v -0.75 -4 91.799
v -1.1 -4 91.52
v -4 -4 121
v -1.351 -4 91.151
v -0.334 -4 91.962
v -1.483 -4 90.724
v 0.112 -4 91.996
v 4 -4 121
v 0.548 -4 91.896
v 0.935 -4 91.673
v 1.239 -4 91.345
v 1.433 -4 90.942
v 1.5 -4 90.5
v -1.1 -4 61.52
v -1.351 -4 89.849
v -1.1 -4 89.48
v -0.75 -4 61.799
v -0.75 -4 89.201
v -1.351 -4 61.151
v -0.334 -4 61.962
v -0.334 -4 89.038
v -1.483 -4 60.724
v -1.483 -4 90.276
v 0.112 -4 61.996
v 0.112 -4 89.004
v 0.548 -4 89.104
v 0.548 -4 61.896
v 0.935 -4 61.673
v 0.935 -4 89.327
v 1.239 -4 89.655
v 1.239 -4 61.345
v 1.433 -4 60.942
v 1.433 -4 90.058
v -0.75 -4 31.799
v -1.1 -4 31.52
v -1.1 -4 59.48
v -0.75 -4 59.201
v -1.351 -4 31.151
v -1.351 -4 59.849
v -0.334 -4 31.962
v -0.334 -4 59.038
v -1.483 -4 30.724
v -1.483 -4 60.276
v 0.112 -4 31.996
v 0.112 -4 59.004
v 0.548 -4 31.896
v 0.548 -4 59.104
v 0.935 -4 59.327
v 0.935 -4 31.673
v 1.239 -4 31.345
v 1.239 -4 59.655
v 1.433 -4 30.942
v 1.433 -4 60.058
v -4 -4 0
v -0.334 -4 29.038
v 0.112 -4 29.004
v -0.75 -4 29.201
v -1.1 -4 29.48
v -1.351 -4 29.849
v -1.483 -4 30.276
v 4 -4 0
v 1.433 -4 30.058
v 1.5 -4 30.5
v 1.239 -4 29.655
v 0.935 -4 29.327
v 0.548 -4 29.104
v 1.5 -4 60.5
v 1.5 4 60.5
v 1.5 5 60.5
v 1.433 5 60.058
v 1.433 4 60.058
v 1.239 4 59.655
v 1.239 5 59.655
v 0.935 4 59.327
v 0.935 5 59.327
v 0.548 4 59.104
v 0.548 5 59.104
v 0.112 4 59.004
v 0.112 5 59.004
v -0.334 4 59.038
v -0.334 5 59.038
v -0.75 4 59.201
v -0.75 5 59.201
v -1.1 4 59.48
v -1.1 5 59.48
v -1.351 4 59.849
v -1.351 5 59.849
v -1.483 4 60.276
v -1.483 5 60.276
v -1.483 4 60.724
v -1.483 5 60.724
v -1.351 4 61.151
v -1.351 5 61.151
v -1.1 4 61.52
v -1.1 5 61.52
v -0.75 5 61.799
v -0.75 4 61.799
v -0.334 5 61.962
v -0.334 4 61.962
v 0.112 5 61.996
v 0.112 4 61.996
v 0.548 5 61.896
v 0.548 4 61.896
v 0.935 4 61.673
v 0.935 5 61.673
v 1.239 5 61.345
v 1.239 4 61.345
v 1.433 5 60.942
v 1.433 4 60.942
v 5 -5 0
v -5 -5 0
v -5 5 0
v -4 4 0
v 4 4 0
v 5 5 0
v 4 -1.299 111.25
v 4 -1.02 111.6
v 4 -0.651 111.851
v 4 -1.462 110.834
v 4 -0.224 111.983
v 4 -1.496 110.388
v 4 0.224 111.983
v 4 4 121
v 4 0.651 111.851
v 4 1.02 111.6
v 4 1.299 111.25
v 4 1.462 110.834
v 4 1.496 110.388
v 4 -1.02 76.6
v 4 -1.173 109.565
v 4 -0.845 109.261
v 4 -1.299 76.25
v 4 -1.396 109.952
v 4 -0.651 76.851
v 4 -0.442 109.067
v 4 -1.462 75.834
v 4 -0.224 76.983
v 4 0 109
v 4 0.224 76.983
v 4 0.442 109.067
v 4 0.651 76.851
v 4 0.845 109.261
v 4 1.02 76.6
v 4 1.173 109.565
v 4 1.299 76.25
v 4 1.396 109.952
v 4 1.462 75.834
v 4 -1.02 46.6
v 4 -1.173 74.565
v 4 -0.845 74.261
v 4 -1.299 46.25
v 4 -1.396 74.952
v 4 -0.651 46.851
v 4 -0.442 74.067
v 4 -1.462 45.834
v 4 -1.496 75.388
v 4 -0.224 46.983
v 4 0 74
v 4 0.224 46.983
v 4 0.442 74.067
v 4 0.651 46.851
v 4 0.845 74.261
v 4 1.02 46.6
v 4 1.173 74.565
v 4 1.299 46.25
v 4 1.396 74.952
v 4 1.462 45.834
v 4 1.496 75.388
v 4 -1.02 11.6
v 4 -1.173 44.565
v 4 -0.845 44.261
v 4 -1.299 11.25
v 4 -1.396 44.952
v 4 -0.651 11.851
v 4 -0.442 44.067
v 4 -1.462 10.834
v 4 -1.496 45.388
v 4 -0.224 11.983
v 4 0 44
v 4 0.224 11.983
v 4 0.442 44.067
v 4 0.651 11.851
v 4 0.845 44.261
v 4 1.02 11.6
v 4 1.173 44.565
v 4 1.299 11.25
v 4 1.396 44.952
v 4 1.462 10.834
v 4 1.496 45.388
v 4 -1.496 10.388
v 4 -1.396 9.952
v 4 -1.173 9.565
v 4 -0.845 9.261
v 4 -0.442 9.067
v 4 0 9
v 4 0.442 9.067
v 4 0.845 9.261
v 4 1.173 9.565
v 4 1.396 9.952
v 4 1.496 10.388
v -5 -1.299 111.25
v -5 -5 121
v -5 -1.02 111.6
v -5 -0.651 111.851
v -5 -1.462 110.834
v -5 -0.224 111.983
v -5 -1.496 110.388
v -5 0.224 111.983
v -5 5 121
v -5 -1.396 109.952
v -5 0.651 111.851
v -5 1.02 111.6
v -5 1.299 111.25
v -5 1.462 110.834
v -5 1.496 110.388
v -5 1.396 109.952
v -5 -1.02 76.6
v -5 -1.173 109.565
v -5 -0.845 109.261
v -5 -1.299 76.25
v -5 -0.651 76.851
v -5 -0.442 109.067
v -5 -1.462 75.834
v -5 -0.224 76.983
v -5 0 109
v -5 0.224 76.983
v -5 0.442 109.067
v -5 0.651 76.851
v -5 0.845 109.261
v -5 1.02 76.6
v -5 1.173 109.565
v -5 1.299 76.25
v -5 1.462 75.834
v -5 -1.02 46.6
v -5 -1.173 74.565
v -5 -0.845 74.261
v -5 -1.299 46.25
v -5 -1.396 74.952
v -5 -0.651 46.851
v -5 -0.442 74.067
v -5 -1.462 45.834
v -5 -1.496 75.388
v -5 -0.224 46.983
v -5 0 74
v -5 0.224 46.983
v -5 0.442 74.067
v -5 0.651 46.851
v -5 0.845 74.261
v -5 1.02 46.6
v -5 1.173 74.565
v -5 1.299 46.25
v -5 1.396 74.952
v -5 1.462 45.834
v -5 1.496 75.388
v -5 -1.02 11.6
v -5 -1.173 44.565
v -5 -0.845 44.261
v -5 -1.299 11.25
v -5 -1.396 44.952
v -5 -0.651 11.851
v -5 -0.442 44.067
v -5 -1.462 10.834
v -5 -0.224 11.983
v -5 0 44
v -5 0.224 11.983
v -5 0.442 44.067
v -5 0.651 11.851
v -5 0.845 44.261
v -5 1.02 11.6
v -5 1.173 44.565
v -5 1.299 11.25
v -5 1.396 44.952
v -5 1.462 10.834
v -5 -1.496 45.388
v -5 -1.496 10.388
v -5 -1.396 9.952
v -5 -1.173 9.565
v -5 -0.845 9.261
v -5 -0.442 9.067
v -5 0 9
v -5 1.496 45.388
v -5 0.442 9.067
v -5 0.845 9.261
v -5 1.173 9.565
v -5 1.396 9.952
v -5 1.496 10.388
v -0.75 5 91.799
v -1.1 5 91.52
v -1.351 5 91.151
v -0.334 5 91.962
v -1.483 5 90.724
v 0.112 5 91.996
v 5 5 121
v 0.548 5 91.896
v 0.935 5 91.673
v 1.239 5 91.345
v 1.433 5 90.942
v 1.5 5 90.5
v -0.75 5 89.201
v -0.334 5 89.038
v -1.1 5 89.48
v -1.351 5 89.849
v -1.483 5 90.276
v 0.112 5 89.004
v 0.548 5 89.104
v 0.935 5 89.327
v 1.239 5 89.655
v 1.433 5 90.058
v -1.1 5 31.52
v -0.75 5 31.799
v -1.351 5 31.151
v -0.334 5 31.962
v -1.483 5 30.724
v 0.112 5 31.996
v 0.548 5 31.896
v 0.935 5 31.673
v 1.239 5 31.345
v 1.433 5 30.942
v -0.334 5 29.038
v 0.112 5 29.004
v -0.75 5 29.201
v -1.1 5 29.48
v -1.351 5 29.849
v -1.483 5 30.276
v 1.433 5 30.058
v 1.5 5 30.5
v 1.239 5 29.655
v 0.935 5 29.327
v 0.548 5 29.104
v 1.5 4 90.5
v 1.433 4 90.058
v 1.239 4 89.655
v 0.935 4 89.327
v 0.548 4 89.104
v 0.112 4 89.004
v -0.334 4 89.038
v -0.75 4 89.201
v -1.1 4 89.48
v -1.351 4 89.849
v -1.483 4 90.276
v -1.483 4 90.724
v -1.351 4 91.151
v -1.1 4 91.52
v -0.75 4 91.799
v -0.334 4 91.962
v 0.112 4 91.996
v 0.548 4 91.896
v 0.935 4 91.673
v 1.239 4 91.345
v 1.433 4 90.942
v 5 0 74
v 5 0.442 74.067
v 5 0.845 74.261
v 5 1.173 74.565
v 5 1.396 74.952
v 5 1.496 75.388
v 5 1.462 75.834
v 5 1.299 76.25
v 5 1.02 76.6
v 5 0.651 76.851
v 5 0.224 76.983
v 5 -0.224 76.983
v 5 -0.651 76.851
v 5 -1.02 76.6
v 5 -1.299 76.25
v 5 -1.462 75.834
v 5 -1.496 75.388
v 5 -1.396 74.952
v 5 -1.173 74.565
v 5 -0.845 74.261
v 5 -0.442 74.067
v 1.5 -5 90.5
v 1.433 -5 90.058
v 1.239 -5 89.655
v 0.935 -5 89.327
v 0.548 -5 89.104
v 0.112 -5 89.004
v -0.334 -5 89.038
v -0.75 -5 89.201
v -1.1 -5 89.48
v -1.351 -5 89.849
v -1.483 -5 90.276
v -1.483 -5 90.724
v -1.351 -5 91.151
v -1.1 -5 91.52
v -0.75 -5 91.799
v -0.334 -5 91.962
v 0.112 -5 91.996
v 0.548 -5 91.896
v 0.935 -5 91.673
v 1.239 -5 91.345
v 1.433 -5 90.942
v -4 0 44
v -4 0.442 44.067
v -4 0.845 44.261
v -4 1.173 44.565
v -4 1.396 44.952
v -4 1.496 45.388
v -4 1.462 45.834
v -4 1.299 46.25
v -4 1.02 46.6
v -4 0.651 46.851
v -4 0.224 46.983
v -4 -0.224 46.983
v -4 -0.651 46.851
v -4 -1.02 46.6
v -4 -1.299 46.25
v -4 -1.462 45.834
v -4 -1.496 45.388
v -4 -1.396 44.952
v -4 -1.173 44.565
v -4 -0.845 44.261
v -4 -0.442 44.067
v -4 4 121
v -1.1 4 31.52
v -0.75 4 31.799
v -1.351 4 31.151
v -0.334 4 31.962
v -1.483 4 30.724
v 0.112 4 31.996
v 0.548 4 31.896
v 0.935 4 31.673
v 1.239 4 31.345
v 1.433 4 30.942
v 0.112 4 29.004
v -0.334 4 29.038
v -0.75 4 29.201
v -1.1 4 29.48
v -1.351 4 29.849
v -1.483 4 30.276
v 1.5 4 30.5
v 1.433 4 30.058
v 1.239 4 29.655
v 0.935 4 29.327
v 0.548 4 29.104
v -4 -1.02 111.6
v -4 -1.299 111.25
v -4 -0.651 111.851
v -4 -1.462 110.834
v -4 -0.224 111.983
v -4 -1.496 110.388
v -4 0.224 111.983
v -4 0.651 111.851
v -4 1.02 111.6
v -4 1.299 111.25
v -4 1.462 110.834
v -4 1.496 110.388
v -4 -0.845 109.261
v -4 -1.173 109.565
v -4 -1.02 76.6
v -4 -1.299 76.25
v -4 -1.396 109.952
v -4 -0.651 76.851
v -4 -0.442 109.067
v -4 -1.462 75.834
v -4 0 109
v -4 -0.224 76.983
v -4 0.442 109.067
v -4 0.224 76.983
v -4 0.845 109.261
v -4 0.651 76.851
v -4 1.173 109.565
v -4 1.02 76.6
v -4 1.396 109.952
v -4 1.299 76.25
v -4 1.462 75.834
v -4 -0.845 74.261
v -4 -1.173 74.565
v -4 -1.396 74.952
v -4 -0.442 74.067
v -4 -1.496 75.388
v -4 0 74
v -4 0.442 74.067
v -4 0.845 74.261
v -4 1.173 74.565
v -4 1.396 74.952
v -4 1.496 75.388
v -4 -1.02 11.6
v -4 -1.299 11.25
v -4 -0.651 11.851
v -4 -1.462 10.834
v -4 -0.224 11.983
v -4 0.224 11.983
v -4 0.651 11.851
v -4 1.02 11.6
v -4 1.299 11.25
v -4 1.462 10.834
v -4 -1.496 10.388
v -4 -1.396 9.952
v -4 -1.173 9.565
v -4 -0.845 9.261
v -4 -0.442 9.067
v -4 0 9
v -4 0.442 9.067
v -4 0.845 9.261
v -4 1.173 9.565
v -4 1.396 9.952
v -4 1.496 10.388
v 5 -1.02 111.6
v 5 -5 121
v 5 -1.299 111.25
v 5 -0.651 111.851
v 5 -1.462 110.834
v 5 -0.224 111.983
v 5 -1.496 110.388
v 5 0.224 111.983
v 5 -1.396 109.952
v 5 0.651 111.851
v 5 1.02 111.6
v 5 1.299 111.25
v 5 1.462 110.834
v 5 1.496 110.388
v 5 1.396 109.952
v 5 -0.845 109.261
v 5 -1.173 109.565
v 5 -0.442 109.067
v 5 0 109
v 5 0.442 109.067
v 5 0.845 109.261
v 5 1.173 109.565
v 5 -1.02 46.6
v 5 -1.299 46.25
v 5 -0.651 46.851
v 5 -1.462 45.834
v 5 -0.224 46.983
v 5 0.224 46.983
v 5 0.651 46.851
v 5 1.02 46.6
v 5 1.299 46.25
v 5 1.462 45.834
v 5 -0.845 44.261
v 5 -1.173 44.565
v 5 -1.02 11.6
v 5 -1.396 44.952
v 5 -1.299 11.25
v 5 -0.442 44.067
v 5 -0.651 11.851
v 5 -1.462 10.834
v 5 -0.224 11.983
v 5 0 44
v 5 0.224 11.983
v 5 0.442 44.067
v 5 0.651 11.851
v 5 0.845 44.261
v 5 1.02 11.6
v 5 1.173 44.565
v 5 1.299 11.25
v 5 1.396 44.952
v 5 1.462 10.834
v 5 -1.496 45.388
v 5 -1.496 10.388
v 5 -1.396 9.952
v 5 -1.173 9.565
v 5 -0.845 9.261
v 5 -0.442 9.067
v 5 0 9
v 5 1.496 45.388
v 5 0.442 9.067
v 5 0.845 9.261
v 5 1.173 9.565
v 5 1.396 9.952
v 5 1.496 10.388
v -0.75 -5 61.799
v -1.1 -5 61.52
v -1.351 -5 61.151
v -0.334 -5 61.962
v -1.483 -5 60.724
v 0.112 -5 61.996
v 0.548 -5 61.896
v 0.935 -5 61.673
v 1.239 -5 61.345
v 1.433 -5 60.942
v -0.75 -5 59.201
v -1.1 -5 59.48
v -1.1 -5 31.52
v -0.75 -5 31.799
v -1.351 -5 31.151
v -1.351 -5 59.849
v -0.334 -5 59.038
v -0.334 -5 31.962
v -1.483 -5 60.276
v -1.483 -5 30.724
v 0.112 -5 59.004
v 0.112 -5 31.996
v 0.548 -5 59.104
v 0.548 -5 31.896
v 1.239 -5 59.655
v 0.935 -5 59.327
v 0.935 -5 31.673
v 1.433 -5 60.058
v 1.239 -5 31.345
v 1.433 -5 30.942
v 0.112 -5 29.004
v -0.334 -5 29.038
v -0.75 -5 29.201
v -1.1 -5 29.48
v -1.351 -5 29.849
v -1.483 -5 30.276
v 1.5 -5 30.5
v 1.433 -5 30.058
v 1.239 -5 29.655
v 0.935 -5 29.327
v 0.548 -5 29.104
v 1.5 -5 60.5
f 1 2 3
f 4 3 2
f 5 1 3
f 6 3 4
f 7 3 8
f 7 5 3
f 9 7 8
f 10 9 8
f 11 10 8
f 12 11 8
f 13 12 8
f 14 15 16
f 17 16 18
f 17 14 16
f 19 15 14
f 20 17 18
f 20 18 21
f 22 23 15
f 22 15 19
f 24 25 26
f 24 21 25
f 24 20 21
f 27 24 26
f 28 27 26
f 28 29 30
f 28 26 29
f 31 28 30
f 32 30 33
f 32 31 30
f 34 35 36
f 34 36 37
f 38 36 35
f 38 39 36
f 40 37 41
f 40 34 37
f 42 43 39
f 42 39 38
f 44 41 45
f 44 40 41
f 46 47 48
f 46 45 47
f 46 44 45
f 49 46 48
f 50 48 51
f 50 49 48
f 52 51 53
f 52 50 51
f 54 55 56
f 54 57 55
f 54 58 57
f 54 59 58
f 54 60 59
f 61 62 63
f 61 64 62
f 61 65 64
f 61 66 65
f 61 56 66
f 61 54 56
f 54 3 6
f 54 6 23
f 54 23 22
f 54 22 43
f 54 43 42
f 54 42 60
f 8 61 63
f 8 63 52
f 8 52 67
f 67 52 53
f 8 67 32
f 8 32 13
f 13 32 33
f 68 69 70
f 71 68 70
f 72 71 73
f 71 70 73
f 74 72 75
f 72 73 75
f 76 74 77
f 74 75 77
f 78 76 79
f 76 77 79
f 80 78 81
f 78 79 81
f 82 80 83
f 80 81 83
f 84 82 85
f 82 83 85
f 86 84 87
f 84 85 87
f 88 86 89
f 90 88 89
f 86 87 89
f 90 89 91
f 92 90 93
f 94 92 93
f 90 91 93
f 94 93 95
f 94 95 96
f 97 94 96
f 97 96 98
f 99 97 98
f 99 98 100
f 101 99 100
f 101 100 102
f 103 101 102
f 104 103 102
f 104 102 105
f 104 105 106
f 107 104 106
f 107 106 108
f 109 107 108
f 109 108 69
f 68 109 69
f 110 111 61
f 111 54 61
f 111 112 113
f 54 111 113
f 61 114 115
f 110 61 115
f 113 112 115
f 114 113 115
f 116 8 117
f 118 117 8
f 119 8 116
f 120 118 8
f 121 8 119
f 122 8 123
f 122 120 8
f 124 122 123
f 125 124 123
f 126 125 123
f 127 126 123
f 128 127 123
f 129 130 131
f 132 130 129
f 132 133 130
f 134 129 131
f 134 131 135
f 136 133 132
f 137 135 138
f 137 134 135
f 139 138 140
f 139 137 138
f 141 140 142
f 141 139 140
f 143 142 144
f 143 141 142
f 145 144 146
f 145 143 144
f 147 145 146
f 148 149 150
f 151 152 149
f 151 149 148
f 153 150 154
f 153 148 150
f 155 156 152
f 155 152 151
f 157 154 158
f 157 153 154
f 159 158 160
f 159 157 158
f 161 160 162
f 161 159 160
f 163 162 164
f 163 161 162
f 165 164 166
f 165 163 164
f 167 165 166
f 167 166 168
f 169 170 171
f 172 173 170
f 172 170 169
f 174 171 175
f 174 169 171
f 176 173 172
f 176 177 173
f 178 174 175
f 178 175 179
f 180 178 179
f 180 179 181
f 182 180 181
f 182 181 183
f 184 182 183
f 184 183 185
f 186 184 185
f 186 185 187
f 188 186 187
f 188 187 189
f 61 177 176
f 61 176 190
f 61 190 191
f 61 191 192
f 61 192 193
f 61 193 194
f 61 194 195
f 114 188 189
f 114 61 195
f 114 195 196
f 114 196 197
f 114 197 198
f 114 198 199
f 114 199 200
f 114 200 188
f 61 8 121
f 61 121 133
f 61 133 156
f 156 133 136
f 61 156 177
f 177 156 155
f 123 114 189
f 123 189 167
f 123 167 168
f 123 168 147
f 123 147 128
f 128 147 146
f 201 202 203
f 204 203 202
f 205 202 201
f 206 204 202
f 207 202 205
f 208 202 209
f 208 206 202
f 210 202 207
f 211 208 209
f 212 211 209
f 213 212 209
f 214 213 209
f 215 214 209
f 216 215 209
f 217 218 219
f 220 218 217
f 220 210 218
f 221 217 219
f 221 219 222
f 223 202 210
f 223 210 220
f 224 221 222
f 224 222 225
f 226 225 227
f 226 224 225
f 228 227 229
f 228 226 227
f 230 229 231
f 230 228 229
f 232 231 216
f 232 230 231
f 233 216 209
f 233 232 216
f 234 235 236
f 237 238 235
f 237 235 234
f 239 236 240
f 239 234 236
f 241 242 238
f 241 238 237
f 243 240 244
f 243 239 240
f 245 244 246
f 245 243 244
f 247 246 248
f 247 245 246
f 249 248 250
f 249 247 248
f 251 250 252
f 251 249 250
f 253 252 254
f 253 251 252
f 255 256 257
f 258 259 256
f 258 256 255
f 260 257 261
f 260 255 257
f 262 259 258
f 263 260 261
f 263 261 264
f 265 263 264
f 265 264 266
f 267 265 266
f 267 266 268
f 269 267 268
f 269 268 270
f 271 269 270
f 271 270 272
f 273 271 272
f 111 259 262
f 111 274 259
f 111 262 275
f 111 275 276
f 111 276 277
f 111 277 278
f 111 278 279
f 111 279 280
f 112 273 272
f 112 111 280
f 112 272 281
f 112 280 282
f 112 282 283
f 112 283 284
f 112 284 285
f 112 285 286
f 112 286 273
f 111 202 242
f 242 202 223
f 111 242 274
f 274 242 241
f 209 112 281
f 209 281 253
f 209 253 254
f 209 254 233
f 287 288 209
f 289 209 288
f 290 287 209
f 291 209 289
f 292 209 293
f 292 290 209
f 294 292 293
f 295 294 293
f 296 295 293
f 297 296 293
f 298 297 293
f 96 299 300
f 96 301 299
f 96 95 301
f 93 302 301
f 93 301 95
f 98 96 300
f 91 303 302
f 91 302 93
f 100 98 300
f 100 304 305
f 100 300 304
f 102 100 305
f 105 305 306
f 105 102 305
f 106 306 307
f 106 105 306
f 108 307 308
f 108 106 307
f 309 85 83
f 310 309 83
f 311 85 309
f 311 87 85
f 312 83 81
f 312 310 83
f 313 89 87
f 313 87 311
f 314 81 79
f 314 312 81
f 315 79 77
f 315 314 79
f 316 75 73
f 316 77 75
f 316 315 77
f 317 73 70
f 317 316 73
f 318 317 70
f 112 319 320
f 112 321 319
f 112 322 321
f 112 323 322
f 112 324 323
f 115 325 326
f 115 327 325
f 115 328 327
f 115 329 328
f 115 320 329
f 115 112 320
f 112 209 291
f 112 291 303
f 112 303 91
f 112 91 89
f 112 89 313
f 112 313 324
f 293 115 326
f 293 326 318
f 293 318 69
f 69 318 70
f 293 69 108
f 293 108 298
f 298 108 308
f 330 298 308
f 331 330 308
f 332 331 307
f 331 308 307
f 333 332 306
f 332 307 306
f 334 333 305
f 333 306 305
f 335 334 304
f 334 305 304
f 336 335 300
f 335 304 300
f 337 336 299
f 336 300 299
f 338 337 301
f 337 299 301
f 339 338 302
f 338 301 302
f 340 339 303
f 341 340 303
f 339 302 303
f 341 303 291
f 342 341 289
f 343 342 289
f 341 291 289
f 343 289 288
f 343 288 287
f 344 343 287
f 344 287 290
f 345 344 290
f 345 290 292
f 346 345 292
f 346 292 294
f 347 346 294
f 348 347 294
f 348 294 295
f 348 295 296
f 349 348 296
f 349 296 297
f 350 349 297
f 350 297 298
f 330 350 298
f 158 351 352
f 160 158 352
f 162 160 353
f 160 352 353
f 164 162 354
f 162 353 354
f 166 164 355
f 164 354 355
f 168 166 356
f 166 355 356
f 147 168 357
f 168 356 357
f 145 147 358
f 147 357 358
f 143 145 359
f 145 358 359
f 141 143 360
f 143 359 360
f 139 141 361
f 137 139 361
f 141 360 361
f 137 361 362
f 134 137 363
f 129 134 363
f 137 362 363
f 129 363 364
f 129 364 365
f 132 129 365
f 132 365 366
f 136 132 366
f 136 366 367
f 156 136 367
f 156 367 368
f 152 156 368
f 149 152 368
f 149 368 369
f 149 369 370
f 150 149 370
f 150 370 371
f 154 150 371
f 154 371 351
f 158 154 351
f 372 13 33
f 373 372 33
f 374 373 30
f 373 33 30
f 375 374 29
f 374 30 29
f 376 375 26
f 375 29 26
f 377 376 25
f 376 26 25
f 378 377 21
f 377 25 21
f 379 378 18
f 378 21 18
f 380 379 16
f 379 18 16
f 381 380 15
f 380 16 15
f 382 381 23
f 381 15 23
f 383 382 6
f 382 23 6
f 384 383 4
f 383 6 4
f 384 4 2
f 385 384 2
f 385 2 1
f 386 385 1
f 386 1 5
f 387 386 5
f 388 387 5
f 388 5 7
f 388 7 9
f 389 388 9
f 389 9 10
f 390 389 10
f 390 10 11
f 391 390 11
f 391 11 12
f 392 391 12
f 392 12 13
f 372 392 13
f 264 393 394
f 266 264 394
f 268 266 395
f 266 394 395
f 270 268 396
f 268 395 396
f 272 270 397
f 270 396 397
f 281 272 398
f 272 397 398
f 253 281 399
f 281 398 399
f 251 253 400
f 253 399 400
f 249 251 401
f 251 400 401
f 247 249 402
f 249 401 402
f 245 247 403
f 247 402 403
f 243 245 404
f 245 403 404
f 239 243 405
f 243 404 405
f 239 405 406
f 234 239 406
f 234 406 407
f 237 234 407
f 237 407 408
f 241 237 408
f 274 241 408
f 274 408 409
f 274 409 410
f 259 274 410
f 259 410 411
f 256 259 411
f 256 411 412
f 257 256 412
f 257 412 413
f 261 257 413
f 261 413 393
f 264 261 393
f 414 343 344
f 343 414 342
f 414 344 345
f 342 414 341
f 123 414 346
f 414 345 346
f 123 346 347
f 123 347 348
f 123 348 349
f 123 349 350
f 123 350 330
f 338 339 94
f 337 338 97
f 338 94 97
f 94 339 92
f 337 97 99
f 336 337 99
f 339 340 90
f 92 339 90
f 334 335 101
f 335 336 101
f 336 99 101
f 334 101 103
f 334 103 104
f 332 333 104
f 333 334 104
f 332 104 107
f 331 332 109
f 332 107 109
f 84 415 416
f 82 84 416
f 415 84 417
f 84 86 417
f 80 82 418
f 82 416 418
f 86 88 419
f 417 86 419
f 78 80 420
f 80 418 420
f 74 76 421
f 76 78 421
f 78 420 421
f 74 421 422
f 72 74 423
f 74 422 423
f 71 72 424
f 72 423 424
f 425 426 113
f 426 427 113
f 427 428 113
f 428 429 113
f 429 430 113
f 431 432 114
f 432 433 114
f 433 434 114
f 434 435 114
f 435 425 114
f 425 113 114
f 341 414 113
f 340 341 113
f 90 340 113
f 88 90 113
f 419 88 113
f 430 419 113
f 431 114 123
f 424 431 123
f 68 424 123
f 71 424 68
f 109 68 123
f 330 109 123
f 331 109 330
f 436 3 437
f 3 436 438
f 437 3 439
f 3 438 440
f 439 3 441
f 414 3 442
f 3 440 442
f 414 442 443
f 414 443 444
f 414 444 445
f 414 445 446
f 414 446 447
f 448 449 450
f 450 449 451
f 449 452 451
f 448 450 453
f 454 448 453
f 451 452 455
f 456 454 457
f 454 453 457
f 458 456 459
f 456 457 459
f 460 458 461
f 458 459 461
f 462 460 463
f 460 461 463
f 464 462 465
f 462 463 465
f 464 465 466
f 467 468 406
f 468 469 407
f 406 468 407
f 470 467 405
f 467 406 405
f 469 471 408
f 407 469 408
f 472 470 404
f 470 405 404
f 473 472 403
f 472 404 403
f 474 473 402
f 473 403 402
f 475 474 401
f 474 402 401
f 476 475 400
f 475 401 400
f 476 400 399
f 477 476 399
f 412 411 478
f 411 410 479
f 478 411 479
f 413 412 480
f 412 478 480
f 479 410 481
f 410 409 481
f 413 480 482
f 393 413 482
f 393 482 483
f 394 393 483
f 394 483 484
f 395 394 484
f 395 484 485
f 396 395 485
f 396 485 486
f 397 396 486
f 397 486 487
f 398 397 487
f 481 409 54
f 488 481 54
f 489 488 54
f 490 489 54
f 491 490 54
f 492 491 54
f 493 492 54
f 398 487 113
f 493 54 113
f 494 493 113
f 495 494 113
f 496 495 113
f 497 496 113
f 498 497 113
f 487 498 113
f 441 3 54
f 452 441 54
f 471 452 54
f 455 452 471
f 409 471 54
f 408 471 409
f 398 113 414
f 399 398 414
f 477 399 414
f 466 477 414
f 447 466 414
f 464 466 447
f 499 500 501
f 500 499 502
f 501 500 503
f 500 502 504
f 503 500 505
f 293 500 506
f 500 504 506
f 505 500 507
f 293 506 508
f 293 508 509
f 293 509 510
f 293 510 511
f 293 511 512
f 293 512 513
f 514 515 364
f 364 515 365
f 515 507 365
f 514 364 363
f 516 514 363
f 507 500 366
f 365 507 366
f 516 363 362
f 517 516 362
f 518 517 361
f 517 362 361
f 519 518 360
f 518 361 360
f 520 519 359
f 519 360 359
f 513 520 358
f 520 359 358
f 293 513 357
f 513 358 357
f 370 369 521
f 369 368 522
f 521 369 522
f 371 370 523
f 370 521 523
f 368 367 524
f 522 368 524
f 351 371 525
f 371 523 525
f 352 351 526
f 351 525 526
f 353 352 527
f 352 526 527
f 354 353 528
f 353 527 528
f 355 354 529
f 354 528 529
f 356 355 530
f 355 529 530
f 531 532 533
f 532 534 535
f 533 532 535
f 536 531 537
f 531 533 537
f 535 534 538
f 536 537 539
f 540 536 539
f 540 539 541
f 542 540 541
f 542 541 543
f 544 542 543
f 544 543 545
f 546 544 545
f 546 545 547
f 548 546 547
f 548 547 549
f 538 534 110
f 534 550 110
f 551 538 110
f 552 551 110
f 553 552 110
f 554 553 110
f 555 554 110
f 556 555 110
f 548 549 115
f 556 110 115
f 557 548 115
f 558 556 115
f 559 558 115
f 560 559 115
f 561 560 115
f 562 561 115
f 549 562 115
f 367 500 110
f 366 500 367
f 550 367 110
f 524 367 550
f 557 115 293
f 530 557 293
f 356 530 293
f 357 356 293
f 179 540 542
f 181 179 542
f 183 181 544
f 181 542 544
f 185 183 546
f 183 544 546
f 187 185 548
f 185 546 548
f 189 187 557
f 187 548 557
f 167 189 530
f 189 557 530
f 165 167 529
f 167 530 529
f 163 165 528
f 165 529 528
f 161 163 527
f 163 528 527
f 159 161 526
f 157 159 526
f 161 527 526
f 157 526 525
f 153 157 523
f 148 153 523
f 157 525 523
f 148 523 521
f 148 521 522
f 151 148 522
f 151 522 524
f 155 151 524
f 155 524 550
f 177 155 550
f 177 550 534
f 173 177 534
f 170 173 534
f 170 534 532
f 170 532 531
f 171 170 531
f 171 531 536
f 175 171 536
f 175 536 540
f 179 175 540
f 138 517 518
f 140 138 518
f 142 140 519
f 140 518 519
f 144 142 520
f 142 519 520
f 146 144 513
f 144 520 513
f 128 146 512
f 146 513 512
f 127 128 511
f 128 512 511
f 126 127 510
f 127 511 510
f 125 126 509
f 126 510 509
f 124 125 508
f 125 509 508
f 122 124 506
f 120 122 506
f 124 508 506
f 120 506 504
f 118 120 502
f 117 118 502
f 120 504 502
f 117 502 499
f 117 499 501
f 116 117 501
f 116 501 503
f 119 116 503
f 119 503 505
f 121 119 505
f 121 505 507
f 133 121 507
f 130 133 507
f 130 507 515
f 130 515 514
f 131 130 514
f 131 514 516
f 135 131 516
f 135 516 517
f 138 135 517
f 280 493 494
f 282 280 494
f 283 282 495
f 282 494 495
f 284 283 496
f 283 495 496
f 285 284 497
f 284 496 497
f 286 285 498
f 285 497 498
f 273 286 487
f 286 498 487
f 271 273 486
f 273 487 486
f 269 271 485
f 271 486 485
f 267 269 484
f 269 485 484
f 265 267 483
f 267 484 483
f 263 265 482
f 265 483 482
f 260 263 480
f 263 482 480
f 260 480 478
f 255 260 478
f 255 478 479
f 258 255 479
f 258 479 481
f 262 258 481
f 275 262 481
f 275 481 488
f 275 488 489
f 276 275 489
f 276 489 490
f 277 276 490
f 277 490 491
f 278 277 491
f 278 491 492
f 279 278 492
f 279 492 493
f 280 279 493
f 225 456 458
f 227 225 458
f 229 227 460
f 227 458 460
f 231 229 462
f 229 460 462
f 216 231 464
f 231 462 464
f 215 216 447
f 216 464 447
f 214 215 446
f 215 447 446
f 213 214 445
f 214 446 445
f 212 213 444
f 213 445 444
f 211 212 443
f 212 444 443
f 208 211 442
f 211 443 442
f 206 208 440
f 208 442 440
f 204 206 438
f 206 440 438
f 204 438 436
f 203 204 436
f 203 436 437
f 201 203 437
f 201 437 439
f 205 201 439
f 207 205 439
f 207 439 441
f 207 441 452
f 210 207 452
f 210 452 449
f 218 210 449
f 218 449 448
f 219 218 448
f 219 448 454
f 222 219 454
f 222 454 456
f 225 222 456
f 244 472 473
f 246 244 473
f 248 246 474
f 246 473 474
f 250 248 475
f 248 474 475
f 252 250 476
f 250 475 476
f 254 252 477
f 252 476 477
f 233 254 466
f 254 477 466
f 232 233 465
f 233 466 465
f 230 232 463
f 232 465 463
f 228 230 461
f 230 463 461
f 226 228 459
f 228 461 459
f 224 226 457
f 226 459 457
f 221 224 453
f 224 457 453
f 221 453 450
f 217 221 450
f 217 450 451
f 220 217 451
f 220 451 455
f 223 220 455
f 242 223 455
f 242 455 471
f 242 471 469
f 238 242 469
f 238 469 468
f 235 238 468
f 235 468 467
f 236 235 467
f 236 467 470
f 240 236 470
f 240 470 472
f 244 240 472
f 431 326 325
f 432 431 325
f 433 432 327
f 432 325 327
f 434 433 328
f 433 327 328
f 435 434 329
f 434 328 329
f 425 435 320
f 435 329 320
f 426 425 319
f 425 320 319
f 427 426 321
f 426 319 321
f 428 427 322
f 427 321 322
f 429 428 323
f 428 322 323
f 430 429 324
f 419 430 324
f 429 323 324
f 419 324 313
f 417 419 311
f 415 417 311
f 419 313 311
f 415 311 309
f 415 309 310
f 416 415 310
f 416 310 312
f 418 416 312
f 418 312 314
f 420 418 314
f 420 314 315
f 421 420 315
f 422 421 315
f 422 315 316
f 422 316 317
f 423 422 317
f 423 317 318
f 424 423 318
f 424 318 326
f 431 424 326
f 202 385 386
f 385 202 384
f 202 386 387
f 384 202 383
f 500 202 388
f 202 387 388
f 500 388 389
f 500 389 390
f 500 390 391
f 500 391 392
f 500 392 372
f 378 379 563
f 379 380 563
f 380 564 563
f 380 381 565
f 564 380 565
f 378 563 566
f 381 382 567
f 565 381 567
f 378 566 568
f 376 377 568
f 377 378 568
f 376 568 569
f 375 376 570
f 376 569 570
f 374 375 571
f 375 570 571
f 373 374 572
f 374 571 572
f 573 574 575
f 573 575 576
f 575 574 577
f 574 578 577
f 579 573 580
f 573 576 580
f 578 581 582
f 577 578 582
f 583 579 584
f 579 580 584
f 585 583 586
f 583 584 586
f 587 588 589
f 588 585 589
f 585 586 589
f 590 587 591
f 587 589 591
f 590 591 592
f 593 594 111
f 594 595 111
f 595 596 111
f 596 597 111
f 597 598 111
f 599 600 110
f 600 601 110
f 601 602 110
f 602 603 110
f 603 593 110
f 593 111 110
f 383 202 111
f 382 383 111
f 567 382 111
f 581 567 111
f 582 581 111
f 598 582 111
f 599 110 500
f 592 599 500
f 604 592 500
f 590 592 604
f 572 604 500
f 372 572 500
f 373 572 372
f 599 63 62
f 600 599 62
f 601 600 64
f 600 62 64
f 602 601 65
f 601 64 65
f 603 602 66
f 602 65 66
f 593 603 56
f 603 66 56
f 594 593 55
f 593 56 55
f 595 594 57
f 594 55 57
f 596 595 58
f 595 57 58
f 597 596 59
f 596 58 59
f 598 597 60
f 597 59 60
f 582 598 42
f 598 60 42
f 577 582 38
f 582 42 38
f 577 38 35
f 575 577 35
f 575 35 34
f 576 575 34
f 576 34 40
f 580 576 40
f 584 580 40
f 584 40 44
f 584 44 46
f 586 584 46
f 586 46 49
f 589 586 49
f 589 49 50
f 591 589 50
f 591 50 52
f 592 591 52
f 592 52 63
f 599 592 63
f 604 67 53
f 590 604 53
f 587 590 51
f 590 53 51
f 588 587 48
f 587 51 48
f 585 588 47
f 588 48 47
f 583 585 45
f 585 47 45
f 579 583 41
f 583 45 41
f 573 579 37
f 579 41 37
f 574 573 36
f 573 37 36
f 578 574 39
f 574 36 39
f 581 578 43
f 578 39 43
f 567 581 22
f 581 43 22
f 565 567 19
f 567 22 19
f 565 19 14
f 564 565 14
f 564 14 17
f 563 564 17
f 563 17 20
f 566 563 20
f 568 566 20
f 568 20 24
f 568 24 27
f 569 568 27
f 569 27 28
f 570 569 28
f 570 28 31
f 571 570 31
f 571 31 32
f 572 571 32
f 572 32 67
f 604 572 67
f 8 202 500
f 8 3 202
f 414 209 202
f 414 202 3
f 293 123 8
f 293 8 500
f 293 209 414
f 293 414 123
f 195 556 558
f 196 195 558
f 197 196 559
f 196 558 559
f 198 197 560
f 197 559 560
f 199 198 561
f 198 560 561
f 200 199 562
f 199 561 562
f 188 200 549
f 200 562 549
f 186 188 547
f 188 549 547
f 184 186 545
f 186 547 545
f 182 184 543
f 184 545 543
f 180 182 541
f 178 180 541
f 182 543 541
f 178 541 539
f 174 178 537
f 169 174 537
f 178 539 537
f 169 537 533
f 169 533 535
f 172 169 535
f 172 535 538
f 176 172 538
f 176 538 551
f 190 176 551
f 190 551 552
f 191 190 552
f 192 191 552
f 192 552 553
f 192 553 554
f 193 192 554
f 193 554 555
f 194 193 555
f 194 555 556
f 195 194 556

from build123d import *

# Parameters (mm, degrees)
SKETCH_1_W          = 10
SKETCH_1_H          = 10
SKETCH_1_W_2        = 8
SKETCH_1_H_2        = 8
EXTRUDE_1_DEPTH     = 121
SKETCH_2_R          = 1.5
CUT_EXTRUDE_1_DEPTH = 11
SKETCH_3_R          = 1.5
CUT_EXTRUDE_2_DEPTH = 11


with BuildPart() as part:
    # 草图1 → 拉伸-薄壁1 (new body)
    with BuildSketch(Plane.XY):
        Rectangle(SKETCH_1_W, SKETCH_1_H)
        Rectangle(SKETCH_1_W_2, SKETCH_1_H_2, mode=Mode.SUBTRACT)
    extrude(amount=EXTRUDE_1_DEPTH)

    # 草图2 → 切除-拉伸1 (cut, through all)
    with BuildSketch(Plane(origin=(5, 0, 0), x_dir=(0, 0, -1), z_dir=(1, 0, 0))):
        with Locations((-110.5, 0)):
            Circle(SKETCH_2_R)
        with Locations((-75.5, 0)):
            Circle(SKETCH_2_R)
        with Locations((-45.5, 0)):
            Circle(SKETCH_2_R)
        with Locations((-10.5, 0)):
            Circle(SKETCH_2_R)
    extrude(amount=-CUT_EXTRUDE_1_DEPTH, mode=Mode.SUBTRACT)

    # 草图3 → 切除-拉伸2 (cut, through all)
    with BuildSketch(Plane(origin=(0, 5, 0), x_dir=(1, 0, 0), z_dir=(0, 1, 0))):
        with Locations((0, -60.5)):
            Circle(SKETCH_3_R)
        with Locations((0, -30.5)):
            Circle(SKETCH_3_R)
        with Locations((0, -90.5)):
            Circle(SKETCH_3_R)
    extrude(amount=-CUT_EXTRUDE_2_DEPTH, mode=Mode.SUBTRACT)


solid = part.part
